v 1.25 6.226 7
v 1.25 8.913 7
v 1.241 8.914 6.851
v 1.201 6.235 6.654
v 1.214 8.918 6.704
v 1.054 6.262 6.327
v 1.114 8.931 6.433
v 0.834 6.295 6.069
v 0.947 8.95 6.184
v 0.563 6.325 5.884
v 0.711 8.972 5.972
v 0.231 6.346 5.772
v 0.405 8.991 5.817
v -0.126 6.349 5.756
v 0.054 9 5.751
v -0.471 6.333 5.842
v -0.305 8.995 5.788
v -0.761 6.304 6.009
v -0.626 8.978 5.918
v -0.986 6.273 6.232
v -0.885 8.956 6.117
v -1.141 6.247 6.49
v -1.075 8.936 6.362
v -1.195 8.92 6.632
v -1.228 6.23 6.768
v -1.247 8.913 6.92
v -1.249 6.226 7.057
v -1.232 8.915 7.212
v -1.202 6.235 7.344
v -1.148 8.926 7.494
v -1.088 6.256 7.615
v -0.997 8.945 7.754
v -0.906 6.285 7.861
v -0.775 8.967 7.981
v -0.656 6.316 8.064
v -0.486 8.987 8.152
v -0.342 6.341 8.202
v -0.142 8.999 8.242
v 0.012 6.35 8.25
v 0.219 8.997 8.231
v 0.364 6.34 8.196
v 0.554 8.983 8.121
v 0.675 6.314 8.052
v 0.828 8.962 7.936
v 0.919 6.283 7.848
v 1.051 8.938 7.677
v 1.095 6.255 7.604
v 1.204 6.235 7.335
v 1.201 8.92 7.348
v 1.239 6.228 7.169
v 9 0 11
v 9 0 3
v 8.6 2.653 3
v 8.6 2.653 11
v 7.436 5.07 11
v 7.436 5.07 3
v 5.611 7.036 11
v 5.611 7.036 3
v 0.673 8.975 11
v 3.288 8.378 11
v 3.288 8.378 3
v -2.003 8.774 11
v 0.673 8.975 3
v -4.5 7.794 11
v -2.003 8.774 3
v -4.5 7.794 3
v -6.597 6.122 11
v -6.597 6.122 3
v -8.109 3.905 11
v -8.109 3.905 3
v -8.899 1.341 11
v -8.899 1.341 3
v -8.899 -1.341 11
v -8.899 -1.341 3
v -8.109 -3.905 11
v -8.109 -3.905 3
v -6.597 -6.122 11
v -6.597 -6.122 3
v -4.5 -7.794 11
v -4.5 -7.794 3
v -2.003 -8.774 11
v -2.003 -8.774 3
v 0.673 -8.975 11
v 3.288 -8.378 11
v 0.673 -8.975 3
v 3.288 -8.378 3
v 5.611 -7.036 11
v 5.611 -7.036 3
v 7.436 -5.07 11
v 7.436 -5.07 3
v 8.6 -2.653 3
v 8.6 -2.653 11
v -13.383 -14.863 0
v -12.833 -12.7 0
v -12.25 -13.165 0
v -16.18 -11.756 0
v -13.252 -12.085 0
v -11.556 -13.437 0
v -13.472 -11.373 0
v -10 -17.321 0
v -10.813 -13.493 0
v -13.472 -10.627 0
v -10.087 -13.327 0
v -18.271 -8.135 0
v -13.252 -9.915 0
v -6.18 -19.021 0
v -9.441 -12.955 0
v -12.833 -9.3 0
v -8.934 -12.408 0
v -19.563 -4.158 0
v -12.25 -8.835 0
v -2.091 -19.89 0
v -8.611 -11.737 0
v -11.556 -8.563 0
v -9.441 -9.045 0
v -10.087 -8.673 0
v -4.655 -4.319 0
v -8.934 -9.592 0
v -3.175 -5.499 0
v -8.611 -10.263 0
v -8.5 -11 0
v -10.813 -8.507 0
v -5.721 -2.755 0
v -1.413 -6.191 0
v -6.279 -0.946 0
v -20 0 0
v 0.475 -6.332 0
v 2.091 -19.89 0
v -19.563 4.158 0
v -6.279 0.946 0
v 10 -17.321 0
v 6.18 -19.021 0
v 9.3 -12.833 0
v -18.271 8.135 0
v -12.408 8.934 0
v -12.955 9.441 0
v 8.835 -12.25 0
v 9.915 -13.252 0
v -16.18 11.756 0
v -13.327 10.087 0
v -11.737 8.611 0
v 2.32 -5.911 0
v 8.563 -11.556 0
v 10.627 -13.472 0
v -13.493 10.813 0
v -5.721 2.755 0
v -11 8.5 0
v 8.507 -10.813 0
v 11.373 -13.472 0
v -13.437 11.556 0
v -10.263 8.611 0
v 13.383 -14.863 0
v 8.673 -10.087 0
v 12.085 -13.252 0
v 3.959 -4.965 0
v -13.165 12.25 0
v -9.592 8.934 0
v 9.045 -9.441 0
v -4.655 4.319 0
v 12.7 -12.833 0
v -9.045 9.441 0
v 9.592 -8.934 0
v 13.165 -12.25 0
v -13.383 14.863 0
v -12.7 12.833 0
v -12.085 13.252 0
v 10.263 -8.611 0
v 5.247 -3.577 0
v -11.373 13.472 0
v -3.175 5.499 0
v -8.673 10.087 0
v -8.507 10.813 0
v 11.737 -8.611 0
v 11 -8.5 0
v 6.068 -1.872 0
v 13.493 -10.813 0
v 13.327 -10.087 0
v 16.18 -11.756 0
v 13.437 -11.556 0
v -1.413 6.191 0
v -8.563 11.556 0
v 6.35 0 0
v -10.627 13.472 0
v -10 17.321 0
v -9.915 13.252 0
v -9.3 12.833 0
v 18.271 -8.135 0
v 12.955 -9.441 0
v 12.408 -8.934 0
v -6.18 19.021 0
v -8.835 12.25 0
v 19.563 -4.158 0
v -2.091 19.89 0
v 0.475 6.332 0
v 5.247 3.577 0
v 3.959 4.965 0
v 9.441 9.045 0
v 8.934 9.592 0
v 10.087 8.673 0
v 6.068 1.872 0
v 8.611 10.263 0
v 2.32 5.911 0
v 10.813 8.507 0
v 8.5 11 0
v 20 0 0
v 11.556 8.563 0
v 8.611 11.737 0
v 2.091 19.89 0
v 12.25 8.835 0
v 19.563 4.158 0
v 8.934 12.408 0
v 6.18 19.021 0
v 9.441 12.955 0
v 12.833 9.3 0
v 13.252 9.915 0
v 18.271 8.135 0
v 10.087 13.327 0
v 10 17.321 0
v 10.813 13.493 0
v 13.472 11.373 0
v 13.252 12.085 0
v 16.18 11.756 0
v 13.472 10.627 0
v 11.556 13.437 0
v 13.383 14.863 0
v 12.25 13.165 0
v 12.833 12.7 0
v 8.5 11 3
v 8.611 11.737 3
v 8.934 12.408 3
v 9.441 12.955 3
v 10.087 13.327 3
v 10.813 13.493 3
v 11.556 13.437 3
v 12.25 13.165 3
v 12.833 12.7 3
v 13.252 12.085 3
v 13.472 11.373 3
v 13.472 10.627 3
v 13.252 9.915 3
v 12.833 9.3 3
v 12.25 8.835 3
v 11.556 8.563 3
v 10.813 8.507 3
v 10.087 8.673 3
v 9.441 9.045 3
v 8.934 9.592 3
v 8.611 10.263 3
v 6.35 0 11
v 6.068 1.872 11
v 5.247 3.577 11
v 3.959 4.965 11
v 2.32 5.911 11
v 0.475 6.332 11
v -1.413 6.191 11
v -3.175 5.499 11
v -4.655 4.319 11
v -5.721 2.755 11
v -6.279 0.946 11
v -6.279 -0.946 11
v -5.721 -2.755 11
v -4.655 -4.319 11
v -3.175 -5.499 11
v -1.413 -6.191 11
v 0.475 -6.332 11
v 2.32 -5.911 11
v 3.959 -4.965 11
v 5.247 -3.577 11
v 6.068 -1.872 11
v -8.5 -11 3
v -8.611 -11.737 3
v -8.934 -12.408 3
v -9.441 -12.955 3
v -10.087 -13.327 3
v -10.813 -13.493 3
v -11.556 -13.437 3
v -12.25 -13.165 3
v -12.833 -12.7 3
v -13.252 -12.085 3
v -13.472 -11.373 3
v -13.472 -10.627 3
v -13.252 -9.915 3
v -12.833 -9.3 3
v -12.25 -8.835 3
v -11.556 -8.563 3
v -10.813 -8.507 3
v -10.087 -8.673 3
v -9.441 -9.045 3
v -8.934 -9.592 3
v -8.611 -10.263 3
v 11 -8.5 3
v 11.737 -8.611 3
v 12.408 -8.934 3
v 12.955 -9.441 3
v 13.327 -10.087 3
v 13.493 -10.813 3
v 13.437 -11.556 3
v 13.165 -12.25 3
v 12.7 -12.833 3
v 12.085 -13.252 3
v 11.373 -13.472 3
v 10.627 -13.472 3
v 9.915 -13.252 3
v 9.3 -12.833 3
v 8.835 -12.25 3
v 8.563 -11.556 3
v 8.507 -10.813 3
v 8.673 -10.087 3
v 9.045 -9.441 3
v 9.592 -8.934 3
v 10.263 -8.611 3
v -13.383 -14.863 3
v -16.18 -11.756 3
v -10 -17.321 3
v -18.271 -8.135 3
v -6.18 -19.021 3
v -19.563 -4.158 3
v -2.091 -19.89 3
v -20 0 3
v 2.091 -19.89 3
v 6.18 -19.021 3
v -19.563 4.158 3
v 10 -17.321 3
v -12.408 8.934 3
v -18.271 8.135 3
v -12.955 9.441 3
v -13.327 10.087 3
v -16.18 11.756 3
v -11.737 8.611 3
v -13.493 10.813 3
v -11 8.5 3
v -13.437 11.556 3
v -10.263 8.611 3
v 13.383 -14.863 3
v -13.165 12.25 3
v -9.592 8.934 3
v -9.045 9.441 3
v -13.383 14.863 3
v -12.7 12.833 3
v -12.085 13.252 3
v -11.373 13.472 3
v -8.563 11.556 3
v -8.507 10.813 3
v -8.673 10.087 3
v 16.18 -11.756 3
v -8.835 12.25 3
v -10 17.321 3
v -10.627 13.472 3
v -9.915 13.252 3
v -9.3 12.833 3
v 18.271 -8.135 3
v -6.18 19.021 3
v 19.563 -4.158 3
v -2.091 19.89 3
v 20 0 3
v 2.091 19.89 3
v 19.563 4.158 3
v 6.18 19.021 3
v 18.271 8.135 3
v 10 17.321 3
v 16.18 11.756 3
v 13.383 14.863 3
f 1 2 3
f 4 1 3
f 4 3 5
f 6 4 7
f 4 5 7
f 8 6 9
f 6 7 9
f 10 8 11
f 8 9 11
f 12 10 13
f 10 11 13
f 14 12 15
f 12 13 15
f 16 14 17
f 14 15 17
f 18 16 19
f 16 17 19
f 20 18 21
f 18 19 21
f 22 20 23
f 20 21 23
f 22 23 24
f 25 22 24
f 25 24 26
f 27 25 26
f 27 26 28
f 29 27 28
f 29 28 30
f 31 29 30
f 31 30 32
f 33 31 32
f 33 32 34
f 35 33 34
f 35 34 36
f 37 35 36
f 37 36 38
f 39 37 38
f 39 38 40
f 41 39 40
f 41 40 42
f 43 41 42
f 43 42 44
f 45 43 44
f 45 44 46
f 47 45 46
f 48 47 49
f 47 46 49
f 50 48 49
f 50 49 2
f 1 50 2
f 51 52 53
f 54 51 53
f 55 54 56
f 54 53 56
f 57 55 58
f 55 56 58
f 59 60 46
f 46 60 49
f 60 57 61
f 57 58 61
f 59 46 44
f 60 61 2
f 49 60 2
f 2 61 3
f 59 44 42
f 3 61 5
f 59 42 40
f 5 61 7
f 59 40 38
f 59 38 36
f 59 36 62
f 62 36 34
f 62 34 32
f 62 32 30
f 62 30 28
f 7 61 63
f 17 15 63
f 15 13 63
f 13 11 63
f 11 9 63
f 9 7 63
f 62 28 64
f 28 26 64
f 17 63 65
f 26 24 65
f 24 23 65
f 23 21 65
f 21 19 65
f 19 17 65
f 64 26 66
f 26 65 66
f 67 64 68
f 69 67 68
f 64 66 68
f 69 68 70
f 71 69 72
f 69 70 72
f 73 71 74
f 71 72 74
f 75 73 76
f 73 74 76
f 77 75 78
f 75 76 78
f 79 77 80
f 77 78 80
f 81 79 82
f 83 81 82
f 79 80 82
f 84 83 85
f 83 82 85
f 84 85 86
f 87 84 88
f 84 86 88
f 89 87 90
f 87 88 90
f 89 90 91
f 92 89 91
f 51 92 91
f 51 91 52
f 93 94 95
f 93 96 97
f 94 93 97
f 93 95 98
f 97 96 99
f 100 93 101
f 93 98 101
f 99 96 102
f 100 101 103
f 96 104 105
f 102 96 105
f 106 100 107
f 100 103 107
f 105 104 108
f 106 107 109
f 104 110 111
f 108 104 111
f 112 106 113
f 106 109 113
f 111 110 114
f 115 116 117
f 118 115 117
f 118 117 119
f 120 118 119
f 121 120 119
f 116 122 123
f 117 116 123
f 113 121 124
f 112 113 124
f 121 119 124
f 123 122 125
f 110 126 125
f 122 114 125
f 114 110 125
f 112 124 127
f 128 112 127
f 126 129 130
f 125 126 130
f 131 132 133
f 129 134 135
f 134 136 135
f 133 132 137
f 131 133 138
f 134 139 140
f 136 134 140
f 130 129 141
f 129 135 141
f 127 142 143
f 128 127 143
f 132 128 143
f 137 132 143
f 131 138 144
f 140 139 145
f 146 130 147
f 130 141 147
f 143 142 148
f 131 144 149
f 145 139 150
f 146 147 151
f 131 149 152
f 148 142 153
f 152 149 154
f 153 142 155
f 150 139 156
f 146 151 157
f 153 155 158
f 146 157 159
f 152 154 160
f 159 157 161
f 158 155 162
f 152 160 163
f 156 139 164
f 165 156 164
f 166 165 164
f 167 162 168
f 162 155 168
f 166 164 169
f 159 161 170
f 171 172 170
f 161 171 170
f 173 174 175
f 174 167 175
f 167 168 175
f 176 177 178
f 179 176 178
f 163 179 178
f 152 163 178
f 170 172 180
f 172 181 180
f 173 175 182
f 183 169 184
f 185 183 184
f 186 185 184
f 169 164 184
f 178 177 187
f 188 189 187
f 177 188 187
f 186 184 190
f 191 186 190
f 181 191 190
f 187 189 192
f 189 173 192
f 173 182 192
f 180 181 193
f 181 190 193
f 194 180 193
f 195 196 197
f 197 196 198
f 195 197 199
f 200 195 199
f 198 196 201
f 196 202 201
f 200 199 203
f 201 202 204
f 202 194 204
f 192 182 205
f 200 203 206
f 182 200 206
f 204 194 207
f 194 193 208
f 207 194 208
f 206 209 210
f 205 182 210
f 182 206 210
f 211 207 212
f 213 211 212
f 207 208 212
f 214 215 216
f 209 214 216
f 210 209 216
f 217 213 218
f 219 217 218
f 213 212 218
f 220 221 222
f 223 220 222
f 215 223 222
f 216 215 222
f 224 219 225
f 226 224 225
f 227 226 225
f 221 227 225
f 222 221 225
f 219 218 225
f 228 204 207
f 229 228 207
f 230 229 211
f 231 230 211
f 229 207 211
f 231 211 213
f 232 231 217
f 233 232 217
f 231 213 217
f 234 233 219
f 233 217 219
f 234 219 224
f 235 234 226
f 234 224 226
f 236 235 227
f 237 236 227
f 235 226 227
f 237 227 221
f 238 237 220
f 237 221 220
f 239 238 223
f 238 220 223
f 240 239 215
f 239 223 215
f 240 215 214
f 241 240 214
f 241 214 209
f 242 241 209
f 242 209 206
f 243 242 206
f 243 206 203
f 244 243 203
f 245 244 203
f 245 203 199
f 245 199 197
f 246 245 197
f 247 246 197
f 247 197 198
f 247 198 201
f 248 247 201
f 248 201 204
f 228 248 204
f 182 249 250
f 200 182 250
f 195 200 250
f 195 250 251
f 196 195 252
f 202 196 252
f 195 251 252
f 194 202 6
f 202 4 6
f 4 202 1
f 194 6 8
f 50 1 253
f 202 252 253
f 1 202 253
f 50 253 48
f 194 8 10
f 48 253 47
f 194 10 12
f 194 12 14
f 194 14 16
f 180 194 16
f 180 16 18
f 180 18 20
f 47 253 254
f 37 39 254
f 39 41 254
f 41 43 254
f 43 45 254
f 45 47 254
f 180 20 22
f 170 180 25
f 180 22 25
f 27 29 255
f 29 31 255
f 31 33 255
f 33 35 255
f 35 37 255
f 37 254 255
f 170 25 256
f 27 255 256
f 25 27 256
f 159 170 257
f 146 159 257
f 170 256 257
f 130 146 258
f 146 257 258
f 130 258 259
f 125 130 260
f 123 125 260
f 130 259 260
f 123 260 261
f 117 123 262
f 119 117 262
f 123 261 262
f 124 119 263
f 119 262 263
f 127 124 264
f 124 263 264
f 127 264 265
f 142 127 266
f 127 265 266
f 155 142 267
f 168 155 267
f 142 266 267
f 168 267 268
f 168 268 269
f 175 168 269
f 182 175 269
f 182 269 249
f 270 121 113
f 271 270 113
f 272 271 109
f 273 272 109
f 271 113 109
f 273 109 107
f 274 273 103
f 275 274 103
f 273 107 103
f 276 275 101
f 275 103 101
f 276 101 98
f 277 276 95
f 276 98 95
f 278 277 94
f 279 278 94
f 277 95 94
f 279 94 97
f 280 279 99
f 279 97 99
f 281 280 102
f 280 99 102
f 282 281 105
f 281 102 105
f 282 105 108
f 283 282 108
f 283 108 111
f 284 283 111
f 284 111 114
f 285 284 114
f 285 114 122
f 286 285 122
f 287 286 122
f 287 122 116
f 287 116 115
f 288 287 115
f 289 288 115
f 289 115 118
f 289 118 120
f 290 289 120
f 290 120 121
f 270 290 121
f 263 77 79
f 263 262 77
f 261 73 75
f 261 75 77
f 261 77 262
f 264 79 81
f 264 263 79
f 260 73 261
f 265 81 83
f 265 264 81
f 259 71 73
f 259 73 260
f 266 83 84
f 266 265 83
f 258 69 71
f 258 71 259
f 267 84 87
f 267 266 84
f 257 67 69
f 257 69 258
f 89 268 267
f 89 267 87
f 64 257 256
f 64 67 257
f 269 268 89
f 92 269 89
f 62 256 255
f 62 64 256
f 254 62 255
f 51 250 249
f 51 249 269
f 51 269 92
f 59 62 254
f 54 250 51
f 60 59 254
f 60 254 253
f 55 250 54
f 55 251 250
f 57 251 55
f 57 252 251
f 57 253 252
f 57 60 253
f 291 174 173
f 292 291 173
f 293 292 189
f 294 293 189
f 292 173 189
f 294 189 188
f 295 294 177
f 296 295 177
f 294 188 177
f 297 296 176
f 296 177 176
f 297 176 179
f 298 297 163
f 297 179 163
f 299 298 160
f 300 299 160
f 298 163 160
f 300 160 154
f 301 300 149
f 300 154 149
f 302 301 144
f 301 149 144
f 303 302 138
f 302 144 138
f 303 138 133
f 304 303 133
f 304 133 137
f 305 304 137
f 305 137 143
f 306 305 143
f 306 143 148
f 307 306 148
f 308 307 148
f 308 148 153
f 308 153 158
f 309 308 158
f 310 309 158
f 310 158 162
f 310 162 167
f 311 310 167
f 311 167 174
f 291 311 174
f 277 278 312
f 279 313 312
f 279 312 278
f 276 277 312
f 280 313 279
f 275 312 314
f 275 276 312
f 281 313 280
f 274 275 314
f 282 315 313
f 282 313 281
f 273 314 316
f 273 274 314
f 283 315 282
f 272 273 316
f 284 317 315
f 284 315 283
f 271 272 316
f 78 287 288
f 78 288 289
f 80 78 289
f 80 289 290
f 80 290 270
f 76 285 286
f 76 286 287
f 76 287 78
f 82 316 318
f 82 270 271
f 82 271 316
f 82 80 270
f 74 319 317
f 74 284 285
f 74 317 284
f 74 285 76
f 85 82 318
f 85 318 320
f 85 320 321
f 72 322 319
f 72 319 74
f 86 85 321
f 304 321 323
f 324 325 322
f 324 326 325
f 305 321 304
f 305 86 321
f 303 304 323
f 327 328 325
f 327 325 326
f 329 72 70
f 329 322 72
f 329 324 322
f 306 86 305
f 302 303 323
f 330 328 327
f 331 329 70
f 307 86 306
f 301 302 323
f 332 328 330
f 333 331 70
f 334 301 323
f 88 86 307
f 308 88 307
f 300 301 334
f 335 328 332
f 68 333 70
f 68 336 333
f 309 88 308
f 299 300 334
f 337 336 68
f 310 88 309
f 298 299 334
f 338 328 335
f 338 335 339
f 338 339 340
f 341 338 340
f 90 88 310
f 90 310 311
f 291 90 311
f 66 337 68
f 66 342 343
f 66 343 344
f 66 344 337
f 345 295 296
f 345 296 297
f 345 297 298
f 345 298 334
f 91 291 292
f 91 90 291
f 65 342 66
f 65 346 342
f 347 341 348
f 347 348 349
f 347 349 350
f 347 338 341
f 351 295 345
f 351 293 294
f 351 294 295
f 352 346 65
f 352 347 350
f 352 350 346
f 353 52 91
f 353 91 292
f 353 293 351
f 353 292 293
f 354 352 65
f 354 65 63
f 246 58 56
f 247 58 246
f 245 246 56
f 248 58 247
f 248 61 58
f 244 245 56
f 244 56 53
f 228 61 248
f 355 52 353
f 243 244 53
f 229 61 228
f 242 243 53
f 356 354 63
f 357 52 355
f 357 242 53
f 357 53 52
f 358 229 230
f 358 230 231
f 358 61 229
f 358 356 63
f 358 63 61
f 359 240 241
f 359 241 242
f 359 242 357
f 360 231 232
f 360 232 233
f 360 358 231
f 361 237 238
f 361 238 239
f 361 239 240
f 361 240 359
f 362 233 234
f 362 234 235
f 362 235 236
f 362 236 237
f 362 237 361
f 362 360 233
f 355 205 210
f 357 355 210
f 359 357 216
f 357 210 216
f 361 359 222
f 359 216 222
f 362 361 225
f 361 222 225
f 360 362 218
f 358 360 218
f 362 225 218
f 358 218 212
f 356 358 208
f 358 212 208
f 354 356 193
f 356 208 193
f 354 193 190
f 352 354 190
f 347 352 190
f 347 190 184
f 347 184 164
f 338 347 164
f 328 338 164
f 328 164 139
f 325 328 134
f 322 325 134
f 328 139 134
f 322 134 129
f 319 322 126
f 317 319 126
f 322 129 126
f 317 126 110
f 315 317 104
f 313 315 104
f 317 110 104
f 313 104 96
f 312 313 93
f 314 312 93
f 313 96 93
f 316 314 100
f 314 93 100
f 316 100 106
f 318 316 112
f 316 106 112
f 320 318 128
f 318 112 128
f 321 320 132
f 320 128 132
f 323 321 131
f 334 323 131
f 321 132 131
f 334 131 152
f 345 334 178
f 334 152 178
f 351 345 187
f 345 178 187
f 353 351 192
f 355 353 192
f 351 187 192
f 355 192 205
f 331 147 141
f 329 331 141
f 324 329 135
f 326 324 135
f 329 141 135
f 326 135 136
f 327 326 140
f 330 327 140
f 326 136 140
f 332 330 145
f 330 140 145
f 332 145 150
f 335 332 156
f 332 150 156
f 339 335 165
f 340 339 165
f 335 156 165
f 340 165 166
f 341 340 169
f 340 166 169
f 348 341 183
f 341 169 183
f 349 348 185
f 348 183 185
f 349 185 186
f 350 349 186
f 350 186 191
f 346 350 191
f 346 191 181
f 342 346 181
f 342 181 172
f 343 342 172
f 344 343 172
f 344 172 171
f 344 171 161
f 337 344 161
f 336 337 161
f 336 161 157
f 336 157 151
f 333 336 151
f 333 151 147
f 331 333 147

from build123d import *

# Parameters (mm, degrees)
SKETCH1_R                = 20
BOSS_EXTRUDE1_DEPTH      = 3
SKETCH2_R                = 9
BOSS_EXTRUDE2_DEPTH      = 8
SKETCH4_R                = 6.35
CUT_EXTRUDE1_DEPTH       = 31.347981811
M3_TAPPED_HOLE1_REACH    = 37.917
M3_TAPPED_HOLE1_BORE_R   = 1.25
F_5_0_5_DIAMETER_HOLE1_D = 5
CIRPATTERN1_COUNT        = 4


with BuildPart() as part:
    # Sketch1 → Boss-Extrude1 (new body)
    with BuildSketch(Plane.XY):
        Circle(SKETCH1_R)
    extrude(amount=BOSS_EXTRUDE1_DEPTH)

    # Sketch2 → Boss-Extrude2 (add)
    with BuildSketch(Plane.XY.offset(3)):
        Circle(SKETCH2_R)
    extrude(amount=BOSS_EXTRUDE2_DEPTH)

    # Sketch4 → Cut-Extrude1 (cut, through all)
    with BuildSketch(Plane.XY.offset(11)):
        Circle(SKETCH4_R)
    extrude(amount=-CUT_EXTRUDE1_DEPTH, mode=Mode.SUBTRACT)

    # M3 Tapped Hole1 bore (on position points) → M3 Tapped Hole1 (cut, up to next)
    with BuildSketch(Plane(origin=(0, 9, 7), x_dir=(1, 0, 0), z_dir=(0, 1, 0)), mode=Mode.PRIVATE) as m3_tapped_hole1_sk1:
        Circle(M3_TAPPED_HOLE1_BORE_R)
    m3_tapped_hole1_tool1 = extrude(m3_tapped_hole1_sk1.sketch, amount=-M3_TAPPED_HOLE1_REACH, mode=Mode.PRIVATE) & part.part
    add(m3_tapped_hole1_tool1.solids().sort_by_distance((0, 9, 7))[0], mode=Mode.SUBTRACT)

    # Ø5.0 (5) Diameter Hole1 (through all)
    with Locations(Plane(origin=(11, 11, 3), x_dir=(1, 0, 0), z_dir=(0, 0, 1))):
        with Locations((0, 0)):
            f_5_0_5_diameter_hole1 = Hole(F_5_0_5_DIAMETER_HOLE1_D / 2)

    # CirPattern1: Ø5.0 (5) Diameter Hole1 ×4 about axis
    cirpattern1_axis = Axis((0, 0, 0), (0, 0, 1))
    for i in range(1, CIRPATTERN1_COUNT):
        add(f_5_0_5_diameter_hole1.rotate(cirpattern1_axis, i * 360 / CIRPATTERN1_COUNT), mode=Mode.SUBTRACT)


solid = part.part
